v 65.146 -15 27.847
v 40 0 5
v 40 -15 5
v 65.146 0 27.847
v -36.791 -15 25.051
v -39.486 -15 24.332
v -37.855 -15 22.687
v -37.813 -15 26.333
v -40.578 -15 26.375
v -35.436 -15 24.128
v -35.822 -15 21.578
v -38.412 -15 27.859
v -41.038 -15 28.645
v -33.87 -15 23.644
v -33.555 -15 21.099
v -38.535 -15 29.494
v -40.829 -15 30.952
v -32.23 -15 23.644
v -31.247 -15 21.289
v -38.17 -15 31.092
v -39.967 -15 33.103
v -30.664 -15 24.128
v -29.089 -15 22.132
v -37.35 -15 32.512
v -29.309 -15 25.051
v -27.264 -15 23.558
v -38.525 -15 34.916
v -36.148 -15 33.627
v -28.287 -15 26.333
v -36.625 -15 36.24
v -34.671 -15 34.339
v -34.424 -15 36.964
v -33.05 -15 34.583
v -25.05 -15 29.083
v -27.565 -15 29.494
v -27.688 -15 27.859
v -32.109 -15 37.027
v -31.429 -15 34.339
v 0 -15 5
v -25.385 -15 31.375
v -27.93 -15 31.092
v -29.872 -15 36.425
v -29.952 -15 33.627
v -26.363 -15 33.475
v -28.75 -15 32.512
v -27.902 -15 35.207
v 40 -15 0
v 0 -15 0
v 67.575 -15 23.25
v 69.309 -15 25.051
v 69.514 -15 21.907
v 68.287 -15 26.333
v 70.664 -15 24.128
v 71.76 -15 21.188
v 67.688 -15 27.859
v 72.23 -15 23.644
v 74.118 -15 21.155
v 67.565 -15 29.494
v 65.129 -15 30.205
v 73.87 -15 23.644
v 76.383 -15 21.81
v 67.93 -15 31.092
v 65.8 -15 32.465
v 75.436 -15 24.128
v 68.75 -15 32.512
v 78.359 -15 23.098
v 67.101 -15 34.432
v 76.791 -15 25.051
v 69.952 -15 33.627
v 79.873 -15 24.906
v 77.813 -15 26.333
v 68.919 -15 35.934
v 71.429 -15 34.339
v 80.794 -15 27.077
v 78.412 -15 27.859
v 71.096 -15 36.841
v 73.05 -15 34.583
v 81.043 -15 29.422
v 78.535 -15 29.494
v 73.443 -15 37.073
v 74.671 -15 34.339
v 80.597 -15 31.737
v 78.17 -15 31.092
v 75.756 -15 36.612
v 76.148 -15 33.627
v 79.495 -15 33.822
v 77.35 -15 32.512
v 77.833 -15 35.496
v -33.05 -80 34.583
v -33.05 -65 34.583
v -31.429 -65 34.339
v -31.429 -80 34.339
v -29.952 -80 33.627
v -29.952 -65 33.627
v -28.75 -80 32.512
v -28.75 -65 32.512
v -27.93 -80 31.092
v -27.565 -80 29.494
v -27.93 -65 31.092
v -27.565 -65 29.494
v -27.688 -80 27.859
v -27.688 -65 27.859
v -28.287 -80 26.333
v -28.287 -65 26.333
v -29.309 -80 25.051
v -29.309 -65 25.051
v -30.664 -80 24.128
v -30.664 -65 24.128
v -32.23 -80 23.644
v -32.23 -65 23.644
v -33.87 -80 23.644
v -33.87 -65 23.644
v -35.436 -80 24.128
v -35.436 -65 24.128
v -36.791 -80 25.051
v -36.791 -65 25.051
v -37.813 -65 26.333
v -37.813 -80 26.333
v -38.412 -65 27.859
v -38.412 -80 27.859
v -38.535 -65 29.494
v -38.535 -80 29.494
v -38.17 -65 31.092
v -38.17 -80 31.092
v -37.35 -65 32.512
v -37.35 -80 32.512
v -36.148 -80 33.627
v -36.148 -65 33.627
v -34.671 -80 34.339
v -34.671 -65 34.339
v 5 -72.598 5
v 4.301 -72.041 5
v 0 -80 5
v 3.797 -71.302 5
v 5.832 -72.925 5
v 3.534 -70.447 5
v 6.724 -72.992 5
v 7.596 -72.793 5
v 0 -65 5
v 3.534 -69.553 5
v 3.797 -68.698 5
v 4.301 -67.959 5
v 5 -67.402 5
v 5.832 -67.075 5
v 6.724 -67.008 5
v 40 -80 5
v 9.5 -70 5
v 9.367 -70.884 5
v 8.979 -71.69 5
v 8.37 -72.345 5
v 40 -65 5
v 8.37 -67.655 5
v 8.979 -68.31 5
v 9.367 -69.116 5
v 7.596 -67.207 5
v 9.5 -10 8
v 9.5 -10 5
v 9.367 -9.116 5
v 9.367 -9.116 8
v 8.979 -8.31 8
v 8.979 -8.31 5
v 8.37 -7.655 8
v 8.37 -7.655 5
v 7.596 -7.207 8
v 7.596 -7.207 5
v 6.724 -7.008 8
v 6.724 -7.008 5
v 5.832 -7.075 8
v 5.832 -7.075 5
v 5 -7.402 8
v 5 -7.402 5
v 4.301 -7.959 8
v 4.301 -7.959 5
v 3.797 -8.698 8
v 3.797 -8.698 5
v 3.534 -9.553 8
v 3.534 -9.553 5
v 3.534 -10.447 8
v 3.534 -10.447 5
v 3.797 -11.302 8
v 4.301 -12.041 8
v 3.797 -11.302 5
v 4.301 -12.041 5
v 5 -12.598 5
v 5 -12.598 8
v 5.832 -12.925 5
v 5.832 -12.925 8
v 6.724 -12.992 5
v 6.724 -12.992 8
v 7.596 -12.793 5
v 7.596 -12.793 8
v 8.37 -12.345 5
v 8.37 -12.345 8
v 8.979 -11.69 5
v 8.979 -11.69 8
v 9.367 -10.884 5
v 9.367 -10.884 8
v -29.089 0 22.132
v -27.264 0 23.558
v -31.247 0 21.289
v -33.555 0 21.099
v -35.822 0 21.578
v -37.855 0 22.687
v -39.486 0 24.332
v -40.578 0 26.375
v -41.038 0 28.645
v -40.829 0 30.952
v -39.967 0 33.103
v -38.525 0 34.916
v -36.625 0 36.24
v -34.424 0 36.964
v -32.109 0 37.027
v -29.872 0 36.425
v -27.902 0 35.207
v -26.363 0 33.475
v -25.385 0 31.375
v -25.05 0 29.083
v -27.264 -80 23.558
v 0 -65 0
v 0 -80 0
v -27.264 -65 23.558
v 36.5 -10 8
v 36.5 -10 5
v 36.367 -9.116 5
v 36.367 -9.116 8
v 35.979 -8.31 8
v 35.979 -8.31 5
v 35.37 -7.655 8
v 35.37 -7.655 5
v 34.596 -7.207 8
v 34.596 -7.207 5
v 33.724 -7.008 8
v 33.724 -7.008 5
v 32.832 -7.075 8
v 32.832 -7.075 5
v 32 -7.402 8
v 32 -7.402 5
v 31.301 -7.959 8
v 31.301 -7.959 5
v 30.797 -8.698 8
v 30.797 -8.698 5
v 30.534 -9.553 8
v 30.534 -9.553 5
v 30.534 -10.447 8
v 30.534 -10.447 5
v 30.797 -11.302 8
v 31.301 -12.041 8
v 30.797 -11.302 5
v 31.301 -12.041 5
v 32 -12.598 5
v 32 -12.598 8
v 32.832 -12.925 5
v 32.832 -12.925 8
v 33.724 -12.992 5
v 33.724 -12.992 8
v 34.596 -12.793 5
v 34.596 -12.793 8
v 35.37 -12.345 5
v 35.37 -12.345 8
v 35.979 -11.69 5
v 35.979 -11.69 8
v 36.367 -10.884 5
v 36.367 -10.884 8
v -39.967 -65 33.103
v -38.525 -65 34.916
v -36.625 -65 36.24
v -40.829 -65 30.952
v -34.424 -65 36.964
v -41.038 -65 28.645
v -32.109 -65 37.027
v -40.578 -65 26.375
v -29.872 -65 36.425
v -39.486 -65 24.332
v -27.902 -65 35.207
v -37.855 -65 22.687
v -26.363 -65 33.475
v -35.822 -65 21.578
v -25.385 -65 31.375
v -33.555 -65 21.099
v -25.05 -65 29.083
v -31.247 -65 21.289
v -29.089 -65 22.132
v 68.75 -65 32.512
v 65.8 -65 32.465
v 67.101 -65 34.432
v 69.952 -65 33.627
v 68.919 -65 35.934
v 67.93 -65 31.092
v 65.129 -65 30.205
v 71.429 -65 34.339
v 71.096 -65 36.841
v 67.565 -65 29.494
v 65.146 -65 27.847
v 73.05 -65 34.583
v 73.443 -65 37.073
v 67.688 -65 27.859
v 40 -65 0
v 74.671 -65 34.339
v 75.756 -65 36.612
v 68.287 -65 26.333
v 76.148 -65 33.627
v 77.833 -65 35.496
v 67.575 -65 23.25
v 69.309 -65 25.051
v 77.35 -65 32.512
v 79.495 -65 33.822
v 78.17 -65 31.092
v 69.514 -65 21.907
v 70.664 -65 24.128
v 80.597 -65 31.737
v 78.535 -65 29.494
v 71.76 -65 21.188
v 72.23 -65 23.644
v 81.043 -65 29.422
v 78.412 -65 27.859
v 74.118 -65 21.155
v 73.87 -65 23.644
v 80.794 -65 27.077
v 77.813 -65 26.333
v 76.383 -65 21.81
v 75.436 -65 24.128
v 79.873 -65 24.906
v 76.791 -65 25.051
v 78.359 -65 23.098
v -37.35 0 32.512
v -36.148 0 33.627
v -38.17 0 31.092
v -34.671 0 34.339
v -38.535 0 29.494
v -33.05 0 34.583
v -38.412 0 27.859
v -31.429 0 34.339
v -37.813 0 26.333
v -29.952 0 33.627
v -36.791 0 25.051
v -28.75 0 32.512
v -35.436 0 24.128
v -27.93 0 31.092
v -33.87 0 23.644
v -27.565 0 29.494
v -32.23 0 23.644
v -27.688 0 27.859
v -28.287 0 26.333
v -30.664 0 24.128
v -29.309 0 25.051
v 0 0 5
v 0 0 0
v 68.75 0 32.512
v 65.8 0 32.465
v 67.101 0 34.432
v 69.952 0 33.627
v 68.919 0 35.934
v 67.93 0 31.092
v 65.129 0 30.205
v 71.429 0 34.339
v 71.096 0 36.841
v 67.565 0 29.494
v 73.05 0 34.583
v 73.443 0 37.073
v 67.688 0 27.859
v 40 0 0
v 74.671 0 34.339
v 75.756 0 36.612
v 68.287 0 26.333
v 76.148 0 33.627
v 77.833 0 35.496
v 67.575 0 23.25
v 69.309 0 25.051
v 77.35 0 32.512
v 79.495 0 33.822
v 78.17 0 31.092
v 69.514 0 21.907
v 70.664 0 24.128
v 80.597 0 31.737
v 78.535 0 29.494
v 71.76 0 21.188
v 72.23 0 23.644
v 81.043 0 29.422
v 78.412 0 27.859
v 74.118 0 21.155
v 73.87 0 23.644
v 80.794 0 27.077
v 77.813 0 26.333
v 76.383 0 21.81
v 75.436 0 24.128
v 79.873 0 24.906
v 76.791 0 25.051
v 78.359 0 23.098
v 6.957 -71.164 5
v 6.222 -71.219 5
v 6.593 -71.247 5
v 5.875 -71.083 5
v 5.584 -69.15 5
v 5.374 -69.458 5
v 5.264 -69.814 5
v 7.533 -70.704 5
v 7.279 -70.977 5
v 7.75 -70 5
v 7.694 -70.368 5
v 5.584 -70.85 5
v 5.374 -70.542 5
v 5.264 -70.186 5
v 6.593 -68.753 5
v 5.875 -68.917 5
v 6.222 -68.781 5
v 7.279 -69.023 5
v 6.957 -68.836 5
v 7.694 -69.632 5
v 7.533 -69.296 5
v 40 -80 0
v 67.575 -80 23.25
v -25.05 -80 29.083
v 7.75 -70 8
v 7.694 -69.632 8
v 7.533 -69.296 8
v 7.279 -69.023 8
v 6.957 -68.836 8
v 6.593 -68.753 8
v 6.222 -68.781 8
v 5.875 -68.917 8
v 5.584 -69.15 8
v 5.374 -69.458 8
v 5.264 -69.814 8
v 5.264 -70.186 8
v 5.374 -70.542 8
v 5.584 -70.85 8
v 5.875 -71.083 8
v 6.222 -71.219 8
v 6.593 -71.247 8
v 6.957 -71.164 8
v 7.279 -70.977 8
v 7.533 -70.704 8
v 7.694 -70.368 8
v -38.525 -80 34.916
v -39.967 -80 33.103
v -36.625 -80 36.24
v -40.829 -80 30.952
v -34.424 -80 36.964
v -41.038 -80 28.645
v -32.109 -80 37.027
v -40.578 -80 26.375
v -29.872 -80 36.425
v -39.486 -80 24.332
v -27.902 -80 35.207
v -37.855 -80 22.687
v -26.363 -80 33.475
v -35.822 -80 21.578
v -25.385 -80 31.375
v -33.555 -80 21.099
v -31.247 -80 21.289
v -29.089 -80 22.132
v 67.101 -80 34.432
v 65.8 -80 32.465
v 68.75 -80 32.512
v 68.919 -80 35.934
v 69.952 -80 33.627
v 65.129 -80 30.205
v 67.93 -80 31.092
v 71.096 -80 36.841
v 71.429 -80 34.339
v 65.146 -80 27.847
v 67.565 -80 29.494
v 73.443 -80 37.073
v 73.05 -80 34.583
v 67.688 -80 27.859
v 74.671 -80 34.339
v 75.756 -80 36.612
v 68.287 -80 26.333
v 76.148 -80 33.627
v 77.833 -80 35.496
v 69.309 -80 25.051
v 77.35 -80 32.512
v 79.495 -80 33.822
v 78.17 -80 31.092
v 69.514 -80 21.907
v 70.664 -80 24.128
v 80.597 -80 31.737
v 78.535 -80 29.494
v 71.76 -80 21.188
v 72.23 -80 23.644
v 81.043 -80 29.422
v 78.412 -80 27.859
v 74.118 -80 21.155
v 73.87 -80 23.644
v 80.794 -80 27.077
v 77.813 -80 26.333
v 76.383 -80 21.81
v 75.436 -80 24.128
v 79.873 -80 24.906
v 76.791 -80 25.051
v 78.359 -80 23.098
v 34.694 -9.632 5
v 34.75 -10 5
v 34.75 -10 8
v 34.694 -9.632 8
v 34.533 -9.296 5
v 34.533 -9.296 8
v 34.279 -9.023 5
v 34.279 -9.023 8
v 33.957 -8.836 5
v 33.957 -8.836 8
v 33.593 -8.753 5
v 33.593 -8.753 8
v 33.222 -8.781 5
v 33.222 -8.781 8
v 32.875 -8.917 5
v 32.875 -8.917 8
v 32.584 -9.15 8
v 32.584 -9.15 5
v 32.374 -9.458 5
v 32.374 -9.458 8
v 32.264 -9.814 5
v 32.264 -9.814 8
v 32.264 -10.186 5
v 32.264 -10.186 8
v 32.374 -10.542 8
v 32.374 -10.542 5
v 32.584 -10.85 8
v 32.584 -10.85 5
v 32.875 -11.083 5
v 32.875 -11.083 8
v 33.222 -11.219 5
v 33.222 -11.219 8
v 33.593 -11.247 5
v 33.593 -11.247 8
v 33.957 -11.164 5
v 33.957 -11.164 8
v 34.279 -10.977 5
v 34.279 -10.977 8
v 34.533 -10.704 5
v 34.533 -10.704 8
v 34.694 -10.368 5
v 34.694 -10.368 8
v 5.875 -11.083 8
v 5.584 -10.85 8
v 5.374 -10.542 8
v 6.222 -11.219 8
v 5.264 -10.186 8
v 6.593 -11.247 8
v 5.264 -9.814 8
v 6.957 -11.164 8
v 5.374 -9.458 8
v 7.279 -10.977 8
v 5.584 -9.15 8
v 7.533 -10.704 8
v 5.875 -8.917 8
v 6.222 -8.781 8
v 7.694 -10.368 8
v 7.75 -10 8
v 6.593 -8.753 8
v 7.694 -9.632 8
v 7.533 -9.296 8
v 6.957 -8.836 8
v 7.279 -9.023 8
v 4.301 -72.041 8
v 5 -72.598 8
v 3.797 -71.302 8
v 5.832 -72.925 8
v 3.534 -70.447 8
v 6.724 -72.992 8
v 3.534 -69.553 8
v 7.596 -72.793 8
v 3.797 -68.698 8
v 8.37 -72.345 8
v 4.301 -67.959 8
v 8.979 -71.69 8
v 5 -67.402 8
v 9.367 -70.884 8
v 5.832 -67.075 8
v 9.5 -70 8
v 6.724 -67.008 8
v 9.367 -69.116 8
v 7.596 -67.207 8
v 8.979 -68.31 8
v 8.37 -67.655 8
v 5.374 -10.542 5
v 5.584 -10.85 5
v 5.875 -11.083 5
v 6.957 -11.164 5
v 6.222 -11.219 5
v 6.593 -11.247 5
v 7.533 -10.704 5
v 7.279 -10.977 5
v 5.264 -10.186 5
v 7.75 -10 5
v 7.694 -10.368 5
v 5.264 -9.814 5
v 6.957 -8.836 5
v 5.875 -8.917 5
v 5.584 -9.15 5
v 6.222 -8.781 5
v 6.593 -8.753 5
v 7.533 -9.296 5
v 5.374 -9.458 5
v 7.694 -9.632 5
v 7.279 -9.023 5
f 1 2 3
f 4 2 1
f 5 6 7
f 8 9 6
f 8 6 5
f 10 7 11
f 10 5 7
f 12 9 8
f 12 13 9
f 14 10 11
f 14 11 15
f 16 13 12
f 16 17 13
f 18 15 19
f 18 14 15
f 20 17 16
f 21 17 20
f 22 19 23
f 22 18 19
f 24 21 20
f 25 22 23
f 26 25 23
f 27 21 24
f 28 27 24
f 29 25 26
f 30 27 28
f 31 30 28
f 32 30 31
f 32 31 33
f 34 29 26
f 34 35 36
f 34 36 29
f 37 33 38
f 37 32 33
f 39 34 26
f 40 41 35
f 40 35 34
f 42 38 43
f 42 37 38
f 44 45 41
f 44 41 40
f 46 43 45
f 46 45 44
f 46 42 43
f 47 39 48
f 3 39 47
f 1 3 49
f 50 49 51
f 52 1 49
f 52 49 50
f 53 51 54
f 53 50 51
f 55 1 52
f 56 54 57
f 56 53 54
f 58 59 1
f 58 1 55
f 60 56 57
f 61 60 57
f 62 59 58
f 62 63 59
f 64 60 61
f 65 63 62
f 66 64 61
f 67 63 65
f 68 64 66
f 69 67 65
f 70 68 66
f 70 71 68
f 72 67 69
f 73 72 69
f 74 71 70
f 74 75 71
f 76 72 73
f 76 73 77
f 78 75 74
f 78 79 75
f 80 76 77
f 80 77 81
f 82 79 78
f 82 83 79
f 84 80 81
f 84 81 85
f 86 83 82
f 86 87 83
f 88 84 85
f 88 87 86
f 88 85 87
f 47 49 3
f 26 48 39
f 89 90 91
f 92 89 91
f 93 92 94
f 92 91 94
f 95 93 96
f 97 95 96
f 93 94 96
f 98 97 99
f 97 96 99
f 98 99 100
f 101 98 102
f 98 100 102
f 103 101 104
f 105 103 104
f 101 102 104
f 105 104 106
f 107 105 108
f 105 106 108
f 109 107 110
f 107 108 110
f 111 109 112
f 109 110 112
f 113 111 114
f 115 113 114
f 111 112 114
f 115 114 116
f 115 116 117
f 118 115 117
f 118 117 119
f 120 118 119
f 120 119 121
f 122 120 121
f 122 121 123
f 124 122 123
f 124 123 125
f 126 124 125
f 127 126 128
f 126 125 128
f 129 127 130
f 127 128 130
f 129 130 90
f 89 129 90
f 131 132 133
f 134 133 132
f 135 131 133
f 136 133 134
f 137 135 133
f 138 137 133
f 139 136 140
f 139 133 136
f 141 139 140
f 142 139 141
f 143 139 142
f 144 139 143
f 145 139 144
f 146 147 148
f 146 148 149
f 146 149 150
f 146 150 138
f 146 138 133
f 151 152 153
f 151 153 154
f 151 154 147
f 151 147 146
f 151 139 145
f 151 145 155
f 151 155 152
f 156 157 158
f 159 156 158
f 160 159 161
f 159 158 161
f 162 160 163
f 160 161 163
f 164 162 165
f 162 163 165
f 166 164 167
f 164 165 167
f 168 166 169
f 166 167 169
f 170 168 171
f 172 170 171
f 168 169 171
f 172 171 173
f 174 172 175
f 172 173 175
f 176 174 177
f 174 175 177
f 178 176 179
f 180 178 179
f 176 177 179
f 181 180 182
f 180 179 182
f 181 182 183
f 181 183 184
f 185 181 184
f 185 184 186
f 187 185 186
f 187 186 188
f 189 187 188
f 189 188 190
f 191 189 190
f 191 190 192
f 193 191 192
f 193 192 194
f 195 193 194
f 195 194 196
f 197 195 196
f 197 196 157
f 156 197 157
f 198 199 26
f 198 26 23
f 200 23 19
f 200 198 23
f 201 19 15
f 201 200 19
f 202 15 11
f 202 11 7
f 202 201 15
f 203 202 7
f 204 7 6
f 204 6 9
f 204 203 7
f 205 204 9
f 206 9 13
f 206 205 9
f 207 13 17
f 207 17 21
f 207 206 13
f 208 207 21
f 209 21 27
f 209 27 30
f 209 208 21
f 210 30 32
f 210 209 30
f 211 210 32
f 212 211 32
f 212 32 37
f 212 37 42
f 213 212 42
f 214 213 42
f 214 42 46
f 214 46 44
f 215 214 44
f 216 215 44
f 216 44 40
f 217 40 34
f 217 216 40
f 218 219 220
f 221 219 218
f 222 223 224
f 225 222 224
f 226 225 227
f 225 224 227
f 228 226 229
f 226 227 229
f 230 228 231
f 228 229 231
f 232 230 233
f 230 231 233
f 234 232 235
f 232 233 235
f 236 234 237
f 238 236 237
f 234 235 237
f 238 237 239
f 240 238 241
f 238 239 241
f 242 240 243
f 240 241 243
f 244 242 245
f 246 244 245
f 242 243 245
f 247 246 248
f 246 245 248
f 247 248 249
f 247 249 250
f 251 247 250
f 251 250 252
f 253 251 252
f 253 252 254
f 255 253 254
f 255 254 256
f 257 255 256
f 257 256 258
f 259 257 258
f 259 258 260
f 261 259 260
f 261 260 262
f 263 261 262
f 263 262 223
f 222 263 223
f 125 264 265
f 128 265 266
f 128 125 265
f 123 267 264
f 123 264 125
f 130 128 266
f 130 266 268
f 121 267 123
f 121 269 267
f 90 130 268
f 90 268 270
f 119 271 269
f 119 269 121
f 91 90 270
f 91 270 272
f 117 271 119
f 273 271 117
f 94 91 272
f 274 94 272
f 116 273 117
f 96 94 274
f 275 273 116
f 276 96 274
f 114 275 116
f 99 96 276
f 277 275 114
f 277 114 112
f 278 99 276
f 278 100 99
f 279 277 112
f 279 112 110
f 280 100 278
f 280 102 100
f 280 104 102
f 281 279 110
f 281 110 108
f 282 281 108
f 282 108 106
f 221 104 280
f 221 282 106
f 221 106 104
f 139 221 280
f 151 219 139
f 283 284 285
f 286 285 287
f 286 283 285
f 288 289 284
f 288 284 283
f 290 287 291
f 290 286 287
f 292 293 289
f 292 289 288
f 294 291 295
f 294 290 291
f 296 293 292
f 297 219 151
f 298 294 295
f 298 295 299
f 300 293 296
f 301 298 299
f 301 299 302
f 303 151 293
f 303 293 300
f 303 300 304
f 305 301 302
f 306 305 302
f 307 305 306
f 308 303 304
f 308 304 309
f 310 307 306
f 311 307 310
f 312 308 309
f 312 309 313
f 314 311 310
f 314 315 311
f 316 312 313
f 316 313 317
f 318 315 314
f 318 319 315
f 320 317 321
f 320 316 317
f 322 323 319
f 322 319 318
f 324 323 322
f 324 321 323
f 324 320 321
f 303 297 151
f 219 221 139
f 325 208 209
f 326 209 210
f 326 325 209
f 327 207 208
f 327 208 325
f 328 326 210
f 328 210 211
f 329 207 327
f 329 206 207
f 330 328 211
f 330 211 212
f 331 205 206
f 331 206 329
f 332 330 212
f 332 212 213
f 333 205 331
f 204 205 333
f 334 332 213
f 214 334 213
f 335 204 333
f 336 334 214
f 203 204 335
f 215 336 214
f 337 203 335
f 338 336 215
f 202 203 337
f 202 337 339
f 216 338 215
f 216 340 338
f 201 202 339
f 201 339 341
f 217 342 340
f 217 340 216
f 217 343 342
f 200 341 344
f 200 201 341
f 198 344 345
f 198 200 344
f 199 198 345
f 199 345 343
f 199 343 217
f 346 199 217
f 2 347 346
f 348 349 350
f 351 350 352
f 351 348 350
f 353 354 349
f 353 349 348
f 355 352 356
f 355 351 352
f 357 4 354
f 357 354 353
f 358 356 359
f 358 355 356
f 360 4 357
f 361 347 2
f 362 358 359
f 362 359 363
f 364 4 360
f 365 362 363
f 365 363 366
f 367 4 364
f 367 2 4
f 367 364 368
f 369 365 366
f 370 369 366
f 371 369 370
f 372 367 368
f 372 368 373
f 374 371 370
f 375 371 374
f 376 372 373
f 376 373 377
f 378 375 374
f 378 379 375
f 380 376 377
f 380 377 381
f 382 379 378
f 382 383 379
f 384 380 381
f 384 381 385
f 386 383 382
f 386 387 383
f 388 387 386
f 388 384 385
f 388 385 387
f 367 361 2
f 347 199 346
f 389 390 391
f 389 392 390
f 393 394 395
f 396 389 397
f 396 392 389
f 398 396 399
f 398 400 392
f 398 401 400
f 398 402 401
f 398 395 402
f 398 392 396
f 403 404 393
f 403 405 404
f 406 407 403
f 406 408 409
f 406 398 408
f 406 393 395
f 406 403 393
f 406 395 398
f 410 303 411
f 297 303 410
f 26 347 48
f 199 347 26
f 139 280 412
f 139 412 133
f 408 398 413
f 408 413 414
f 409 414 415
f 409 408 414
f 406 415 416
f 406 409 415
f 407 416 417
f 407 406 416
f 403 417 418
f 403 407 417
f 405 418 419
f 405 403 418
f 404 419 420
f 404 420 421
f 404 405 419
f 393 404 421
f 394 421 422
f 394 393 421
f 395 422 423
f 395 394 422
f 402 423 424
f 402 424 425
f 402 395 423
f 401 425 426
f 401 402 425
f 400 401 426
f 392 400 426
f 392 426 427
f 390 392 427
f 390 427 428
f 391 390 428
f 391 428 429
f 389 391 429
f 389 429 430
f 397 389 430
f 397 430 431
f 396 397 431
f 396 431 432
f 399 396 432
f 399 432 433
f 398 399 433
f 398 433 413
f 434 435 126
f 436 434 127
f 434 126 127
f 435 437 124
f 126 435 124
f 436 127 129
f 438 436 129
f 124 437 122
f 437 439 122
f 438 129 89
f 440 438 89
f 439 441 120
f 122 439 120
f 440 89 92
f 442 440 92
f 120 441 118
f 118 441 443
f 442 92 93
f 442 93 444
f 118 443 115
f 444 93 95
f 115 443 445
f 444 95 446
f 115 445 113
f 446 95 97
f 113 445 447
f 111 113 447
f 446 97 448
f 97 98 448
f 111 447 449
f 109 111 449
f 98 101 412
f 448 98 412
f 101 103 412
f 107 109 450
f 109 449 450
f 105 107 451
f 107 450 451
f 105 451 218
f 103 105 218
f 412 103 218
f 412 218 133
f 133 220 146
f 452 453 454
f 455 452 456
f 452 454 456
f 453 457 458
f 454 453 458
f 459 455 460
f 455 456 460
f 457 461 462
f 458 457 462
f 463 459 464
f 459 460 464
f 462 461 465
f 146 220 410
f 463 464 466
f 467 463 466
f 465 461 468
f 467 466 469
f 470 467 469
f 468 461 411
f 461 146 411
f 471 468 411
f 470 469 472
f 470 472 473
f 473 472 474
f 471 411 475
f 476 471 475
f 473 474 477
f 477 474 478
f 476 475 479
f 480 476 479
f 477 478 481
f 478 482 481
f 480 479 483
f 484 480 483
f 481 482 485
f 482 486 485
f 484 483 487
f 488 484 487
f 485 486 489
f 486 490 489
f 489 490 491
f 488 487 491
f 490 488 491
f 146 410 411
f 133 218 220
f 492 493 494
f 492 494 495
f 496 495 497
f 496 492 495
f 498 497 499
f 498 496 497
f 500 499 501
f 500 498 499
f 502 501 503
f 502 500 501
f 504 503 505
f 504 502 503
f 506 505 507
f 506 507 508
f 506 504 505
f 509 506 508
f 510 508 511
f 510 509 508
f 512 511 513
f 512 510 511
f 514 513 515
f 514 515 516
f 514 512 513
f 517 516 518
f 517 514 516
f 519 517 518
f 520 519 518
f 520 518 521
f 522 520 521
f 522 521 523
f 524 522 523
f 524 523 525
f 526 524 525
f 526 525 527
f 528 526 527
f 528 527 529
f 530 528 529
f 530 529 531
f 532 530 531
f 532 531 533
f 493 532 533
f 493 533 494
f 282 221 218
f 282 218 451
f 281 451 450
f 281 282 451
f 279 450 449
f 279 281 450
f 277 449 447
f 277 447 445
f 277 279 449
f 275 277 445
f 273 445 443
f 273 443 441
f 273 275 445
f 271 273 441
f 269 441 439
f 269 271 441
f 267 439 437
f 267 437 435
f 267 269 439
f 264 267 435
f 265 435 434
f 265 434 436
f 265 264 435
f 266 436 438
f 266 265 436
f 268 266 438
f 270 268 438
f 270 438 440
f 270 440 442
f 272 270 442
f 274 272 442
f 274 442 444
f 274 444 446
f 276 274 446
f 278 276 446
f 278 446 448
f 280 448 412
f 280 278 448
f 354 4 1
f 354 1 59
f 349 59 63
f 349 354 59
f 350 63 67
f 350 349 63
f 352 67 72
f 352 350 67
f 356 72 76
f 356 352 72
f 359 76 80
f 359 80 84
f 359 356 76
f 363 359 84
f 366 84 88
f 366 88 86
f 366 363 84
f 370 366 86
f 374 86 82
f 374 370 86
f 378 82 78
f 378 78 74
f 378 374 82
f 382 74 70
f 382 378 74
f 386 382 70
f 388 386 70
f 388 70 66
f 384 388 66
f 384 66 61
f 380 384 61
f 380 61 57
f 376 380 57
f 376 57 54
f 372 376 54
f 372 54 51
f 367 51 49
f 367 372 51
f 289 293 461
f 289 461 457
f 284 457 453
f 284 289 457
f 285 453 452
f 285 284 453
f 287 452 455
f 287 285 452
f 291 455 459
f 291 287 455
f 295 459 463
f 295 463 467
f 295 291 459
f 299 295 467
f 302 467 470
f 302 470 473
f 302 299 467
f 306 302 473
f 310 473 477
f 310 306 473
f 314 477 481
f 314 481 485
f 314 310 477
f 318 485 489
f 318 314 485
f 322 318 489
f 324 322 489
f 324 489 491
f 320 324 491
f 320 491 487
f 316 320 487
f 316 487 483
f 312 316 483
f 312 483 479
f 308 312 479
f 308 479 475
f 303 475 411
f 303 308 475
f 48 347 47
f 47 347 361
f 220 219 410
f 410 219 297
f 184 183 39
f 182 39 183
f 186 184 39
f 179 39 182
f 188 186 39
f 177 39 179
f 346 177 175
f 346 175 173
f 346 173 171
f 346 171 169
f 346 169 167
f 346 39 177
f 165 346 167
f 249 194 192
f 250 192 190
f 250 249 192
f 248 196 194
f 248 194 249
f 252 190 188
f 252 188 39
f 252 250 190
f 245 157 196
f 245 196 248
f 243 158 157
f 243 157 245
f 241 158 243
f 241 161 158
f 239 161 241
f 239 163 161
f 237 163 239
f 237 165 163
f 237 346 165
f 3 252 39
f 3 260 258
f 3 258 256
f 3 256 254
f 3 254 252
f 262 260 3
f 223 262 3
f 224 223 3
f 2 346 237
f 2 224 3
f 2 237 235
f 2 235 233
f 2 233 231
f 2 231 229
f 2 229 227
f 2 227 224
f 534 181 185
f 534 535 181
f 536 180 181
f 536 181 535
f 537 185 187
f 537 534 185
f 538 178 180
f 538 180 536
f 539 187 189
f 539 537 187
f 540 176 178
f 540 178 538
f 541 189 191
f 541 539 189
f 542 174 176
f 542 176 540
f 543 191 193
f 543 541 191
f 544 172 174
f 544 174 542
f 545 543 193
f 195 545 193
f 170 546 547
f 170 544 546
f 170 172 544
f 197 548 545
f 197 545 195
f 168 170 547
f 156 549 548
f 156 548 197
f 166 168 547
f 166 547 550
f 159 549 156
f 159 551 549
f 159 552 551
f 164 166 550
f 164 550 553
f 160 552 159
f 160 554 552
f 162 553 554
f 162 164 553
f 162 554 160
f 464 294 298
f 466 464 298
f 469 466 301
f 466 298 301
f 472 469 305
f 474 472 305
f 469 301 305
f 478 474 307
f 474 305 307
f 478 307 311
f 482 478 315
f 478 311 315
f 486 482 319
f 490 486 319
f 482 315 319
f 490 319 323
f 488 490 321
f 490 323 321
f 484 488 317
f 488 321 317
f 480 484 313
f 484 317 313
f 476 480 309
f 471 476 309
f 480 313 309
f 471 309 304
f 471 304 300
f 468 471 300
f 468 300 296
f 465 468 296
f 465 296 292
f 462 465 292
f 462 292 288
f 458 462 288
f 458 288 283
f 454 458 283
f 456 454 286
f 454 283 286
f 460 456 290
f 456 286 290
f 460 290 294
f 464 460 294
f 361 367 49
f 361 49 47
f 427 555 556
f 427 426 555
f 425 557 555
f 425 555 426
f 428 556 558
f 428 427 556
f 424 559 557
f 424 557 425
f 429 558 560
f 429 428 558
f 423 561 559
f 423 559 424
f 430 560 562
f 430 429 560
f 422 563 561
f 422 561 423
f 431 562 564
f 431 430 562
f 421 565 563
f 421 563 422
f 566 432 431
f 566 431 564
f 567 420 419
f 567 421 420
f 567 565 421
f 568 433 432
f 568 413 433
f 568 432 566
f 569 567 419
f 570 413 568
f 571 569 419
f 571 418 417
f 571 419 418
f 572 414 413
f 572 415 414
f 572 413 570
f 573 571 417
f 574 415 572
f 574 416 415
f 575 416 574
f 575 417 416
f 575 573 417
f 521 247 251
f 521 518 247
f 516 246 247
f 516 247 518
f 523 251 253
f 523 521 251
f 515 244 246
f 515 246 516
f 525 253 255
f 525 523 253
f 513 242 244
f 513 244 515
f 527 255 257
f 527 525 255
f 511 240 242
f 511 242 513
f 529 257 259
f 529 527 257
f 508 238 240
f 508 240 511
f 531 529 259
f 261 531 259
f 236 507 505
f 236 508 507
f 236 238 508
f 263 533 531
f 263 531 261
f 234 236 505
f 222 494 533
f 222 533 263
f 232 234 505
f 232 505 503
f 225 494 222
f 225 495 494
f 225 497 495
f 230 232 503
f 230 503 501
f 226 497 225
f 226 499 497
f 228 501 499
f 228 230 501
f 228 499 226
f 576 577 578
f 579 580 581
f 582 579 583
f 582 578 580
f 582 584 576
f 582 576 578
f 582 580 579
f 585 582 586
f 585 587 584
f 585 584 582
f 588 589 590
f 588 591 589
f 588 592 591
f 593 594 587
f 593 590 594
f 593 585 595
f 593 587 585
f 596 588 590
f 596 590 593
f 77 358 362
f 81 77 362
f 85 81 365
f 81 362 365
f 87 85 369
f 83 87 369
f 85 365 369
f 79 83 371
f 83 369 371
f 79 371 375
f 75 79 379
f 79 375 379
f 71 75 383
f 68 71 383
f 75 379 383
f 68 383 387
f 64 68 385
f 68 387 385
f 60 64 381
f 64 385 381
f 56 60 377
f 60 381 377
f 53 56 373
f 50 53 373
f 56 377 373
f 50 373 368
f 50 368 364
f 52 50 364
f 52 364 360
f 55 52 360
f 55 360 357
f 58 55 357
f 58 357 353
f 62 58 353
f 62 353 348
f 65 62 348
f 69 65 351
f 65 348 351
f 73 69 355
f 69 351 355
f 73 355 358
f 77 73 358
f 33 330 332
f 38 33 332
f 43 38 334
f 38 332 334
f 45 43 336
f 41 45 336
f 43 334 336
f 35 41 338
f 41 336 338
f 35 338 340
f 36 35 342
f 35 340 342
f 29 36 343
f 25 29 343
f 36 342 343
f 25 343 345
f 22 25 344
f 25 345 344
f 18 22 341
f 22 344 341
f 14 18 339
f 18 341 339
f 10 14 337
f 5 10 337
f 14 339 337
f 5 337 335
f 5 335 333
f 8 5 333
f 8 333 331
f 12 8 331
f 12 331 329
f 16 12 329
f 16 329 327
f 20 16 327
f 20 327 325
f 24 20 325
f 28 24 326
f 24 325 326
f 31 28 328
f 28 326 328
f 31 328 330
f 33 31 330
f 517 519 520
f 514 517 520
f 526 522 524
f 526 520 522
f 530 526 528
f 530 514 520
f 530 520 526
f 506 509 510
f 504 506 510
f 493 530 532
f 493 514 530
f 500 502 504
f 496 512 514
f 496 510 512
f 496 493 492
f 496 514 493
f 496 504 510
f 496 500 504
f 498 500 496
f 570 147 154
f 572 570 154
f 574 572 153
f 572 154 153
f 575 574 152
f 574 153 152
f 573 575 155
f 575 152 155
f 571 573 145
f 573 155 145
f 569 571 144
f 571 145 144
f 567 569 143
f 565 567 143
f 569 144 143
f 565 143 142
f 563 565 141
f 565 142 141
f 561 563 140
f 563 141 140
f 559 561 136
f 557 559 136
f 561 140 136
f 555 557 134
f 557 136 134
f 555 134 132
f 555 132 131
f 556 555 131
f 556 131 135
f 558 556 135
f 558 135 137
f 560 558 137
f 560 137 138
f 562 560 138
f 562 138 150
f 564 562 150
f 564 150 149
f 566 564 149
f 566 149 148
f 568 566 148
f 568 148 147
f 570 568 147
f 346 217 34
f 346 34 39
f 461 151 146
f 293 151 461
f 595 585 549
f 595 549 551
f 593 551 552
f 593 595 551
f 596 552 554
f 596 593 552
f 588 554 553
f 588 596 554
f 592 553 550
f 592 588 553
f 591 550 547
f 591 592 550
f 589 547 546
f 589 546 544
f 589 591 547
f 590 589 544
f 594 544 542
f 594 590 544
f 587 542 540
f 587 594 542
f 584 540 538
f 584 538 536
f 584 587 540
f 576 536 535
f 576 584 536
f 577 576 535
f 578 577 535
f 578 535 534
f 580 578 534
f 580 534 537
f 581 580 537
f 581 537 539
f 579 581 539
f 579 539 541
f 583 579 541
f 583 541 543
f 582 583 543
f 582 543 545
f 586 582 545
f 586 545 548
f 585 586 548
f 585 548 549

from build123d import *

# Parameters (mm, degrees)
SKETCH1_W           = 40
SKETCH1_H           = 80
BOSS_EXTRUDE1_DEPTH = 3
SKETCH2_R           = 3
SKETCH2_R_2         = 1.25
BOSS_EXTRUDE2_DEPTH = 5
SKETCH3_R           = 5.5
BOSS_EXTRUDE3_DEPTH = 15
LPATTERN1_COUNT     = 2
LPATTERN1_PITCH     = 65
SKETCH4_W           = 56.102770757
SKETCH4_H           = 50
CUT_EXTRUDE1_DEPTH  = 119.314928378


with BuildPart() as part:
    # Sketch1 → Boss-Extrude1 (new body)
    with BuildSketch(Plane.XY):
        with Locations((20, -40)):
            Rectangle(SKETCH1_W, SKETCH1_H)
    extrude(amount=BOSS_EXTRUDE1_DEPTH)

    # Sketch2 → Boss-Extrude2 (add)
    # profile 1 of 3: a face of its own
    with BuildSketch(Plane.XY.offset(3)):
        with Locations((6.5, -10)):
            Circle(SKETCH2_R)
        with Locations((6.5, -10)):
            Circle(SKETCH2_R_2, mode=Mode.SUBTRACT)
    # profile 2 of 3: a face of its own
    with BuildSketch(Plane.XY.offset(3)):
        with Locations((33.5, -10)):
            Circle(SKETCH2_R)
        with Locations((33.5, -10)):
            Circle(SKETCH2_R_2, mode=Mode.SUBTRACT)
    # profile 3 of 3: a face of its own
    with BuildSketch(Plane.XY.offset(3)):
        with Locations((6.5, -70)):
            Circle(SKETCH2_R)
        with Locations((6.5, -70)):
            Circle(SKETCH2_R_2, mode=Mode.SUBTRACT)
    extrude(amount=BOSS_EXTRUDE2_DEPTH)

    # Sketch3 → Boss-Extrude3 (add)
    with BuildSketch(Plane(origin=(0, 0, 0), x_dir=(1, 0, 0), z_dir=(0, 1, 0))):
        with BuildLine():
            Line((67.575216761, -23.249768733), (40, 0))
            Line((40, 0), (0, 0))
            Line((0, 0), (-27.263861108, -23.558468907))
            ThreePointArc((-27.263861108, -23.558468907), (-40.475938026, -32.058823719), (-25.05, -29.08301384))
            Line((-25.05, -29.08301384), (0, -5))
            Line((0, -5), (40, -5))
            Line((40, -5), (65.146126602, -27.84657326))
            ThreePointArc((65.146126602, -27.84657326), (80.123172295, -32.820691419), (67.575216761, -23.249768733))
        make_face()
        with Locations(Location((-33.05, -29.08301384, 0), (0, 0, 270))):
            Circle(SKETCH3_R, mode=Mode.SUBTRACT)
        with Locations(Location((73.05, -29.08301384, 0), (0, 0, 270))):
            Circle(SKETCH3_R, mode=Mode.SUBTRACT)
    boss_extrude3 = extrude(amount=-BOSS_EXTRUDE3_DEPTH)

    # LPattern1: Boss-Extrude3 ×2
    with Locations(*[(0, -i * LPATTERN1_PITCH, 0) for i in range(1, LPATTERN1_COUNT)]):
        add(boss_extrude3)

    # Sketch4 → Cut-Extrude1 (cut, through all)
    with BuildSketch(Plane.XY.offset(5)):
        with Locations((20.812178196, -40)):
            Rectangle(SKETCH4_W, SKETCH4_H)
    extrude(amount=-CUT_EXTRUDE1_DEPTH, mode=Mode.SUBTRACT)


with BuildPart() as cut_extrude1_piece_1:
    # of the separate pieces the step leaves, piece 1, a body of its own (cut_extrude1_pieces)
    add(part.part.solids().sort_by_distance((0, 0, 0))[0])


with BuildPart() as cut_extrude1_piece_2:
    # of the separate pieces the step leaves, piece 2, a body of its own (cut_extrude1_pieces)
    add(part.part.solids().sort_by_distance((0, -80, 0))[0])


solid = Compound([cut_extrude1_piece_1.part, cut_extrude1_piece_2.part])
